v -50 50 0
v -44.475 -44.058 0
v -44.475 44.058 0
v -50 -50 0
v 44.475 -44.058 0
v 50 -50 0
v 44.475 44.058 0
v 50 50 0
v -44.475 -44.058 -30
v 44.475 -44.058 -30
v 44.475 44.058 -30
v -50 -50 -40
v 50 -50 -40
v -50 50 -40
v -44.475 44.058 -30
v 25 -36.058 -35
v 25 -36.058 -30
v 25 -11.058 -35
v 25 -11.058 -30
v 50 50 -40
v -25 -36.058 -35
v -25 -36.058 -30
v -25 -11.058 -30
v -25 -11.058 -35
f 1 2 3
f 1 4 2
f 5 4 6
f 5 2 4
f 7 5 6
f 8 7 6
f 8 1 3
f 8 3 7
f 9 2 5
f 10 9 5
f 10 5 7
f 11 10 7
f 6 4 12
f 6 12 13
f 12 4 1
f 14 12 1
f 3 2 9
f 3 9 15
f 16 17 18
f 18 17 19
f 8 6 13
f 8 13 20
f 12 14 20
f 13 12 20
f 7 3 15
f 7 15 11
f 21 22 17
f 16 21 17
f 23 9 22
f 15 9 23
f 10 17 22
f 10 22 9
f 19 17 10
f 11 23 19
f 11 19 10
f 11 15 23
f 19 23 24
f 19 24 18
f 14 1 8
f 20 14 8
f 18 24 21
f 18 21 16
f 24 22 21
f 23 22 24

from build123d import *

# Parameters (mm, degrees)
F0_W     = 100
F0_H     = 100
F1_DEPTH = 40
F2_W     = 88.950806
F2_H     = 88.116594
F3_DEPTH = 30
F4_W     = 50
F4_H     = 25
F5_DEPTH = 35


with BuildPart() as f1:
    # F0 (on Top) → F1 (new body)
    with BuildSketch(Plane.XY):
        Rectangle(F0_W, F0_H)
    extrude(amount=-F1_DEPTH)

    # F2 (on face) → F3 (cut)
    with BuildSketch(Plane.XY):
        Rectangle(F2_W, F2_H)
    extrude(amount=-F3_DEPTH, mode=Mode.SUBTRACT)

    # F4 (on Top) → F5 (cut)
    with BuildSketch(Plane.XY):
        with Locations((0, -23.558297)):
            Rectangle(F4_W, F4_H)
    extrude(amount=-F5_DEPTH, mode=Mode.SUBTRACT)


solid = f1.part
